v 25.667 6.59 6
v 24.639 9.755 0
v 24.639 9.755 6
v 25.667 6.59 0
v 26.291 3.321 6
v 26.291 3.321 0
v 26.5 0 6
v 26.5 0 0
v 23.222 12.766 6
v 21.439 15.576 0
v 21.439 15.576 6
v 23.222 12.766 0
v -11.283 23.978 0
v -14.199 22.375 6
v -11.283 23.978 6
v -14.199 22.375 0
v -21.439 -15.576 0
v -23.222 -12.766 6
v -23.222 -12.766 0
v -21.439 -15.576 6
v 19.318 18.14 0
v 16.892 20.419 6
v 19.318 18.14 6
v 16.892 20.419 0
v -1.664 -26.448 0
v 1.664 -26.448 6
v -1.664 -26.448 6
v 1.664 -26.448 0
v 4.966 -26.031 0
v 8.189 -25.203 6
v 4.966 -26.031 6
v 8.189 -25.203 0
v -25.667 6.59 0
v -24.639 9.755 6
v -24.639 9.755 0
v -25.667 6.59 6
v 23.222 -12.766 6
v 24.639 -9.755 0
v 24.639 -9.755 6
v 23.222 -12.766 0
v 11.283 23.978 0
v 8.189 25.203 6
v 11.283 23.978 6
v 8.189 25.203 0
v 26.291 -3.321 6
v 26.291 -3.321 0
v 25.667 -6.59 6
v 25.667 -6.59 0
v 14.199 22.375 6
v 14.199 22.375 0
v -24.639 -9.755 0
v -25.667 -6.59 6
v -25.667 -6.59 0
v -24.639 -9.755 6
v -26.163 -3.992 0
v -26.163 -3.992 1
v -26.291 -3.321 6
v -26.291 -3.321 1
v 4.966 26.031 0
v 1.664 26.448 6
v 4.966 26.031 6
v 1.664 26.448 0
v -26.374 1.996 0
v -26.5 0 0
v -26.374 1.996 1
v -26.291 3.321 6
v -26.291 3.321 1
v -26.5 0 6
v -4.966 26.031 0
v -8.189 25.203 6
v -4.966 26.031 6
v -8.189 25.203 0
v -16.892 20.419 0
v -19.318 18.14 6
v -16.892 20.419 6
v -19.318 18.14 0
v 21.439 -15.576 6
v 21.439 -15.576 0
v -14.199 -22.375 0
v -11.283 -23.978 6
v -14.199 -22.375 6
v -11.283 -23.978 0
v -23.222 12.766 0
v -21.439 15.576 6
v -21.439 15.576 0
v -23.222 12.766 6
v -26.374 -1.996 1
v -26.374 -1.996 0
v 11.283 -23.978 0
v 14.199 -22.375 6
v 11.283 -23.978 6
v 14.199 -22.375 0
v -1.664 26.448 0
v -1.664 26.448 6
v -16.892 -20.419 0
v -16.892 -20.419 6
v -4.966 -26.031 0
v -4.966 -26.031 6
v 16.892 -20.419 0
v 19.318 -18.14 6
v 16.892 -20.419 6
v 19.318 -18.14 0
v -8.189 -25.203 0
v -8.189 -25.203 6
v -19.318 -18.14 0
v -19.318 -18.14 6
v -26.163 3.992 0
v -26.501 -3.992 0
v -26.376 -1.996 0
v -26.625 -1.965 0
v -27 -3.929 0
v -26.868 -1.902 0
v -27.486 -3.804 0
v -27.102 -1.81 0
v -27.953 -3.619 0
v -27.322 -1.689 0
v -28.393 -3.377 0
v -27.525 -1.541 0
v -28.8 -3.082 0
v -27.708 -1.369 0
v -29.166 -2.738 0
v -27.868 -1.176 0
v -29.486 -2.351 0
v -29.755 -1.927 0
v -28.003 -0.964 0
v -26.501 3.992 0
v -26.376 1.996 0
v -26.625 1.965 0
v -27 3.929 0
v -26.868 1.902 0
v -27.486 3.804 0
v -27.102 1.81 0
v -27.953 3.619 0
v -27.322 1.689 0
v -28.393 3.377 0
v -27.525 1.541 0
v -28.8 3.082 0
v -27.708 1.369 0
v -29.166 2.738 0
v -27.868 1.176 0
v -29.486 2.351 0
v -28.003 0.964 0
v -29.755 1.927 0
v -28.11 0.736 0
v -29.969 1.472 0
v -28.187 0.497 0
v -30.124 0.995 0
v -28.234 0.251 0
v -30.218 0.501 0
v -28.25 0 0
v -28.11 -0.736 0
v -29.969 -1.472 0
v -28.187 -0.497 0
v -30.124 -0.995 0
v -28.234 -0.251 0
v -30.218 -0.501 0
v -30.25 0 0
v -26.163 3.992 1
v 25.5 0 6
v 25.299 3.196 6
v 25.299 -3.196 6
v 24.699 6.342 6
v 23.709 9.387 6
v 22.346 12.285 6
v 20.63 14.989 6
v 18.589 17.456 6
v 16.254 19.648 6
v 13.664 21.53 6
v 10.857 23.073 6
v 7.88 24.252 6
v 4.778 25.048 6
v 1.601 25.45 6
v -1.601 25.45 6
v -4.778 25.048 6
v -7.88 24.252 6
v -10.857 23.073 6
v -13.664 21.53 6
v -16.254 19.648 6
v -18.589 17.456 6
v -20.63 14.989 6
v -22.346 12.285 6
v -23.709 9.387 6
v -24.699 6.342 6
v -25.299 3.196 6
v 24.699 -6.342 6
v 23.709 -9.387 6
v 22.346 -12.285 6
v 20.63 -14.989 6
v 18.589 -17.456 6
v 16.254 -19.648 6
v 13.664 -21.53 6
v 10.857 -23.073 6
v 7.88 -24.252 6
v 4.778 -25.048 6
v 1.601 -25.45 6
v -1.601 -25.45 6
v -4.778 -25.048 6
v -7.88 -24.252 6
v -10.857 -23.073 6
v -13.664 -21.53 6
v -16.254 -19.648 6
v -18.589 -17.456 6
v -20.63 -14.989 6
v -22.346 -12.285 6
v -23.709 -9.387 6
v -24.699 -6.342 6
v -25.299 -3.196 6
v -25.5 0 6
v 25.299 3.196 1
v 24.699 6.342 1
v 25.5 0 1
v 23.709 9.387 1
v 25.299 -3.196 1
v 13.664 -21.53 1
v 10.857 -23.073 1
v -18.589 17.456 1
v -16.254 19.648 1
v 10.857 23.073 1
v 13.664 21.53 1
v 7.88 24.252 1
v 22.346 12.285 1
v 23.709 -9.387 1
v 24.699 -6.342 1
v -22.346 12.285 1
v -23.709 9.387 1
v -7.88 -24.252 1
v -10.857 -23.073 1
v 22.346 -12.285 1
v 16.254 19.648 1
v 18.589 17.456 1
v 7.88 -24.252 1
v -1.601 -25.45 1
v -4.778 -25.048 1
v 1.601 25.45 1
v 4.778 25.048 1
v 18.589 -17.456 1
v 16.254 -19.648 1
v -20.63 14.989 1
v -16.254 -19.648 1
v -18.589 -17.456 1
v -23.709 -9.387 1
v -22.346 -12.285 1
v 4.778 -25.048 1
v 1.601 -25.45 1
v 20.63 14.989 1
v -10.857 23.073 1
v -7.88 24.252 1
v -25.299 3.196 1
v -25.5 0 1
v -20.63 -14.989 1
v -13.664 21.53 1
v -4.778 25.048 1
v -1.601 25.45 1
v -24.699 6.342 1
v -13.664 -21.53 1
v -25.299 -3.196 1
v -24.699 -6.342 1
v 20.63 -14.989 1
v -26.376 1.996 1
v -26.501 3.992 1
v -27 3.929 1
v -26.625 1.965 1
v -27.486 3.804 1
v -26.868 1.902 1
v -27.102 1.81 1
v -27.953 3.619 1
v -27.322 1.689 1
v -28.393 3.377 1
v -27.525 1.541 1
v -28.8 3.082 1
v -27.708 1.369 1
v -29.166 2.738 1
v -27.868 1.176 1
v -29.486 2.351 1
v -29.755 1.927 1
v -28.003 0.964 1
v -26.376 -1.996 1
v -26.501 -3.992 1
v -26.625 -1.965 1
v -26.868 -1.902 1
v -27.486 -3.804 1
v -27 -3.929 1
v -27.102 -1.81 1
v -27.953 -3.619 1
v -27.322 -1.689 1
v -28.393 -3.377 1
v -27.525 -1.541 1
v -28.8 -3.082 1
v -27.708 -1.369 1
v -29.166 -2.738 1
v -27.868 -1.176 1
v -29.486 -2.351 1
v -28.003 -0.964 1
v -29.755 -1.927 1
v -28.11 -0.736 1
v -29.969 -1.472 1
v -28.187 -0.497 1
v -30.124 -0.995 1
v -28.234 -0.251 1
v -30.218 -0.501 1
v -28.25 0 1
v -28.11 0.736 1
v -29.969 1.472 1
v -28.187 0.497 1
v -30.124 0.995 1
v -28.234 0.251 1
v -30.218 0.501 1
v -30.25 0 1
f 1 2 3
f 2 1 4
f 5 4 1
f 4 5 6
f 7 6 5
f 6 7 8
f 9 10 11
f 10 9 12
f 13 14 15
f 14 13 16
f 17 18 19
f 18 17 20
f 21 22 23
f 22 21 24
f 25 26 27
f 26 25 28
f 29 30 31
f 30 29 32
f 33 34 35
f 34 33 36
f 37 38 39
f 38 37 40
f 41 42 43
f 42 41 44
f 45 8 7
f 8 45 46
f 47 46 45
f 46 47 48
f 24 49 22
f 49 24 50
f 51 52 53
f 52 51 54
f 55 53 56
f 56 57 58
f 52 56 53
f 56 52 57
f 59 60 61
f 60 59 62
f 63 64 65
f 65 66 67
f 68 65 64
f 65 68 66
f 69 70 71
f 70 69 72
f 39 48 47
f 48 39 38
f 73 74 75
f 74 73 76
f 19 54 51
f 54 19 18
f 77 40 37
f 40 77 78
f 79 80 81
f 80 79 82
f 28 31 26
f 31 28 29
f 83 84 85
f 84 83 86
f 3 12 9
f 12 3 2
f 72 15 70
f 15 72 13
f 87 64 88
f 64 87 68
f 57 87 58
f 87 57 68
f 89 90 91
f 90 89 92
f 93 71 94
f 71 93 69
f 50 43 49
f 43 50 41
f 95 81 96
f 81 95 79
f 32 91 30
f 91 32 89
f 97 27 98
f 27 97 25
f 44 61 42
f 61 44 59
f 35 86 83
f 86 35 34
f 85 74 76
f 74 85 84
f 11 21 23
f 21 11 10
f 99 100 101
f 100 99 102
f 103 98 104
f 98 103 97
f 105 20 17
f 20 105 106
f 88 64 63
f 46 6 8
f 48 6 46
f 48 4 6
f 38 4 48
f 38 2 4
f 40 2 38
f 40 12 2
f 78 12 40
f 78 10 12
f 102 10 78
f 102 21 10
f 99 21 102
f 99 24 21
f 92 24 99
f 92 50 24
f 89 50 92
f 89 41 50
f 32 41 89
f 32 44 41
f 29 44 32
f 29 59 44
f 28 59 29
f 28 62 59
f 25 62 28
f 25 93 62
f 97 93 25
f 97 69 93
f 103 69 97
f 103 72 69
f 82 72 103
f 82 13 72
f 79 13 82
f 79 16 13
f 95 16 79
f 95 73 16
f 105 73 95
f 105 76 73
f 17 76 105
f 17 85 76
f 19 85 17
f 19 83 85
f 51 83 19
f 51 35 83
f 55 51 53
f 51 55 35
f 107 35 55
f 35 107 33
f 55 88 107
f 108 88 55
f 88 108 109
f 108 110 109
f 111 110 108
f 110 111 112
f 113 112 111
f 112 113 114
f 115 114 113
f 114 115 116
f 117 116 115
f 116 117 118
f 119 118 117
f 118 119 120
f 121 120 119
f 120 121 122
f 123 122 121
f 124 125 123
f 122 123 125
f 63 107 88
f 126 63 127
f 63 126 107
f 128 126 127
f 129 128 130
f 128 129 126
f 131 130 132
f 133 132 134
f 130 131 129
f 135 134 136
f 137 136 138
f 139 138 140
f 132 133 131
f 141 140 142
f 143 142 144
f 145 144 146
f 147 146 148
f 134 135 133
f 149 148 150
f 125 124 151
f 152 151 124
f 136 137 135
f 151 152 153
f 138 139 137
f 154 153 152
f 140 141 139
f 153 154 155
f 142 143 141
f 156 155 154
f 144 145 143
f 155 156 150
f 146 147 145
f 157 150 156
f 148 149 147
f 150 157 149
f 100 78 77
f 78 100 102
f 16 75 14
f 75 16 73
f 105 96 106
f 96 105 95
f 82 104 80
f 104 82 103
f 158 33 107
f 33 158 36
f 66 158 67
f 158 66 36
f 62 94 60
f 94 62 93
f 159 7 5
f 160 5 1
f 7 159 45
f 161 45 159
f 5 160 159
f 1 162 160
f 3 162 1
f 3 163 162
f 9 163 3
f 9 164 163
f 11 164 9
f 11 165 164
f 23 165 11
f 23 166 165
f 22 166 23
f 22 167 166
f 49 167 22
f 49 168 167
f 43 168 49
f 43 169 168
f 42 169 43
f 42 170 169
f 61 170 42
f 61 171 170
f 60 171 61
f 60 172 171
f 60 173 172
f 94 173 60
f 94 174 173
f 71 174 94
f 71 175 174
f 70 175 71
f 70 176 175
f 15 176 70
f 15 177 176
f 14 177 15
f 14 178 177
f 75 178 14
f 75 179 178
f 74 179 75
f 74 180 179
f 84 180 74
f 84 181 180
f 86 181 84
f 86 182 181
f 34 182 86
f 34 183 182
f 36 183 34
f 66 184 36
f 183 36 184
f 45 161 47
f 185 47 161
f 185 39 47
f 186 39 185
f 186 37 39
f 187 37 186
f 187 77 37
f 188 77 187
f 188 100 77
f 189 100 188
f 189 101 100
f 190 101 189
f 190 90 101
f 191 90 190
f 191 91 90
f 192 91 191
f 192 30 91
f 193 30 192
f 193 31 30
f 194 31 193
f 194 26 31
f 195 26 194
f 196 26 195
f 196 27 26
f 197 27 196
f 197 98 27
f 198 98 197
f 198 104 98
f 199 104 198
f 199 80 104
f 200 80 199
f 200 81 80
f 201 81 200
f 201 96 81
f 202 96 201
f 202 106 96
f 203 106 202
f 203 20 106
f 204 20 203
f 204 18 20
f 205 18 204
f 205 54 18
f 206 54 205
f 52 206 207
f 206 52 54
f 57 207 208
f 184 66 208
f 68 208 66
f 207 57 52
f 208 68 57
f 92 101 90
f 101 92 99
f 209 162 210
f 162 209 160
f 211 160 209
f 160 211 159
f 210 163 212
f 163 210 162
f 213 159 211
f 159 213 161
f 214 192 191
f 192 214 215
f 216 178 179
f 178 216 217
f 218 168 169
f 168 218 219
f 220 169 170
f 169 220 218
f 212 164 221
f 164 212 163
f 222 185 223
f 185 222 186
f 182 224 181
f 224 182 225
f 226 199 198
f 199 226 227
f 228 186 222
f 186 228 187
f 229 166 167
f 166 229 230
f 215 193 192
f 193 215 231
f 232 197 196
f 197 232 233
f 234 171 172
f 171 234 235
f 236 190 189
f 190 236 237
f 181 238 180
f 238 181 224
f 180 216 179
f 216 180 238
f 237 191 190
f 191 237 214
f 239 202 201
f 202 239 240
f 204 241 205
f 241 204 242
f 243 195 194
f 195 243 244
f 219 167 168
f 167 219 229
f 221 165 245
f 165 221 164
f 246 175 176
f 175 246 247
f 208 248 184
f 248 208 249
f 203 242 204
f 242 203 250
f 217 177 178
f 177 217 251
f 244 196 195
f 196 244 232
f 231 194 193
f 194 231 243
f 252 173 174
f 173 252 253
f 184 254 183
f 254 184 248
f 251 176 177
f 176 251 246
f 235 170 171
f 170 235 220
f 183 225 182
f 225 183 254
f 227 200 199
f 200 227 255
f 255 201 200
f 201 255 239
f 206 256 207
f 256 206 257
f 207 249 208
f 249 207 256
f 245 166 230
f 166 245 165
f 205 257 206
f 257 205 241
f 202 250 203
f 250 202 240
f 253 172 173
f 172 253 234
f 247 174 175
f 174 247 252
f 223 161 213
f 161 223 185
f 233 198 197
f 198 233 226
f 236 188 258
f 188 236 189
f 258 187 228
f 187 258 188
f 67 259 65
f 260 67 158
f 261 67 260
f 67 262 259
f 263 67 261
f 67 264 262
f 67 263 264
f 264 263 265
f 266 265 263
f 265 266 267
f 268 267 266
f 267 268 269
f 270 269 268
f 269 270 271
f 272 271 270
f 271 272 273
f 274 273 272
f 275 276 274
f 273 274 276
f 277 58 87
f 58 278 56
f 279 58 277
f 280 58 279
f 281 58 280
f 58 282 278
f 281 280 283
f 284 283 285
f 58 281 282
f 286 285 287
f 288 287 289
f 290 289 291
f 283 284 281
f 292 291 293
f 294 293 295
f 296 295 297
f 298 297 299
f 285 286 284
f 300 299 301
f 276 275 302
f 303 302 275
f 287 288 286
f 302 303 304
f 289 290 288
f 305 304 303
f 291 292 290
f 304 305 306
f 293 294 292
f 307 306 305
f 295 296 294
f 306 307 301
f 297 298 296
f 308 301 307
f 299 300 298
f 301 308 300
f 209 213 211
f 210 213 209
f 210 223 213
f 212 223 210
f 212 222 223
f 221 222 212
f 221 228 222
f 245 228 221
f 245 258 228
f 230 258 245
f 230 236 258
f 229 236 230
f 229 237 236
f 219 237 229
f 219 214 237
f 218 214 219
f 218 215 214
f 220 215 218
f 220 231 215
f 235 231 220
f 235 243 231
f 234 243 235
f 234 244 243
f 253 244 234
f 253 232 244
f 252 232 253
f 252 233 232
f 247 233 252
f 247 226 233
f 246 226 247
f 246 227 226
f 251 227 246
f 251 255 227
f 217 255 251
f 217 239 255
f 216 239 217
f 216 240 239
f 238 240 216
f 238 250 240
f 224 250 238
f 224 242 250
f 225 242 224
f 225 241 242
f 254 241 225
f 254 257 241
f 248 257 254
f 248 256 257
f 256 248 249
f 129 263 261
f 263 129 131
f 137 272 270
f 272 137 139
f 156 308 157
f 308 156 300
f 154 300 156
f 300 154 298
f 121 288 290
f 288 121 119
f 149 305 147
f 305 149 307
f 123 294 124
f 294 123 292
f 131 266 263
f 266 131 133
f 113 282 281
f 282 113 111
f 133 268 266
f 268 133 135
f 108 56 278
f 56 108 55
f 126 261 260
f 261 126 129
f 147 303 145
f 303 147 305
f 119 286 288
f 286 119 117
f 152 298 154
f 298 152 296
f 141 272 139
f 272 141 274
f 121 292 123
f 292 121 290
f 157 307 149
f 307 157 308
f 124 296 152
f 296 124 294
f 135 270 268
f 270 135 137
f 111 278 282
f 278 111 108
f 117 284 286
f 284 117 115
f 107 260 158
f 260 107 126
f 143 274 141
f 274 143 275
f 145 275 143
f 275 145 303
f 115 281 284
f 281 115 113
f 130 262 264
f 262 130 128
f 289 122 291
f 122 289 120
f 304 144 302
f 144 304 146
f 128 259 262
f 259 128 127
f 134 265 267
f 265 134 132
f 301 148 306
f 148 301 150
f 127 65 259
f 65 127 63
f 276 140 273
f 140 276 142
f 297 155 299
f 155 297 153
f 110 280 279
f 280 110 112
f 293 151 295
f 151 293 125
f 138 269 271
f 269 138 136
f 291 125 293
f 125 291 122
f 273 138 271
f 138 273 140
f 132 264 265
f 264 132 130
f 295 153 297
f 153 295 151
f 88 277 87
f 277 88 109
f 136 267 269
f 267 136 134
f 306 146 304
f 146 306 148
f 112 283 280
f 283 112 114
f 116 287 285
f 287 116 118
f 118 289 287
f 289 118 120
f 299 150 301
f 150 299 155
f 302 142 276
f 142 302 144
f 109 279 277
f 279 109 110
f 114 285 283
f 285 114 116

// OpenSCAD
//Parameterised push on lens cap
// Glyn Cowles July 2014
// Added option to have a place for a tether
// Scott Hergott September 2014

//Thickness of sides
thickness=1;//[1:5] 
//Inside diameter
idiam=51;//[10:200]   
//Height
lidh=6;//[2:20]
//Looseness factor (5 = extra .5mm + diameter)
looseness=0;//[0:20]
// Toggle for tether
doTether= "true"; // ["true","false"]

/* [Hidden] */
$fn=50;
loose=looseness/10; // ie looseness = 5 loose = 0.5mm


lid(); 

//-----------------------------------------------------------------------
module tube(d,h,th) {  // d= outside diam
rad=d/2;
difference() {
	cylinder(h=h,r=rad);
	cylinder(h=h,r=rad-th);
	}
}

module tether( edge ) {
translate([-(edge+1)/2, 0, 0])
difference() {
	cylinder(h=thickness,r=4, center=false);
	cylinder(h=thickness,r=2, center=false);
	}
}

//-----------------------------------------------------------------------

module lid(){
union() {
	tube(idiam+thickness*2+loose,lidh,thickness); // sides
	tube(idiam+thickness*2+loose,thickness,idiam+thickness*2+loose); // base
	if (doTether)
	{
		tether(idiam+thickness/2+loose);
	}
}
}
